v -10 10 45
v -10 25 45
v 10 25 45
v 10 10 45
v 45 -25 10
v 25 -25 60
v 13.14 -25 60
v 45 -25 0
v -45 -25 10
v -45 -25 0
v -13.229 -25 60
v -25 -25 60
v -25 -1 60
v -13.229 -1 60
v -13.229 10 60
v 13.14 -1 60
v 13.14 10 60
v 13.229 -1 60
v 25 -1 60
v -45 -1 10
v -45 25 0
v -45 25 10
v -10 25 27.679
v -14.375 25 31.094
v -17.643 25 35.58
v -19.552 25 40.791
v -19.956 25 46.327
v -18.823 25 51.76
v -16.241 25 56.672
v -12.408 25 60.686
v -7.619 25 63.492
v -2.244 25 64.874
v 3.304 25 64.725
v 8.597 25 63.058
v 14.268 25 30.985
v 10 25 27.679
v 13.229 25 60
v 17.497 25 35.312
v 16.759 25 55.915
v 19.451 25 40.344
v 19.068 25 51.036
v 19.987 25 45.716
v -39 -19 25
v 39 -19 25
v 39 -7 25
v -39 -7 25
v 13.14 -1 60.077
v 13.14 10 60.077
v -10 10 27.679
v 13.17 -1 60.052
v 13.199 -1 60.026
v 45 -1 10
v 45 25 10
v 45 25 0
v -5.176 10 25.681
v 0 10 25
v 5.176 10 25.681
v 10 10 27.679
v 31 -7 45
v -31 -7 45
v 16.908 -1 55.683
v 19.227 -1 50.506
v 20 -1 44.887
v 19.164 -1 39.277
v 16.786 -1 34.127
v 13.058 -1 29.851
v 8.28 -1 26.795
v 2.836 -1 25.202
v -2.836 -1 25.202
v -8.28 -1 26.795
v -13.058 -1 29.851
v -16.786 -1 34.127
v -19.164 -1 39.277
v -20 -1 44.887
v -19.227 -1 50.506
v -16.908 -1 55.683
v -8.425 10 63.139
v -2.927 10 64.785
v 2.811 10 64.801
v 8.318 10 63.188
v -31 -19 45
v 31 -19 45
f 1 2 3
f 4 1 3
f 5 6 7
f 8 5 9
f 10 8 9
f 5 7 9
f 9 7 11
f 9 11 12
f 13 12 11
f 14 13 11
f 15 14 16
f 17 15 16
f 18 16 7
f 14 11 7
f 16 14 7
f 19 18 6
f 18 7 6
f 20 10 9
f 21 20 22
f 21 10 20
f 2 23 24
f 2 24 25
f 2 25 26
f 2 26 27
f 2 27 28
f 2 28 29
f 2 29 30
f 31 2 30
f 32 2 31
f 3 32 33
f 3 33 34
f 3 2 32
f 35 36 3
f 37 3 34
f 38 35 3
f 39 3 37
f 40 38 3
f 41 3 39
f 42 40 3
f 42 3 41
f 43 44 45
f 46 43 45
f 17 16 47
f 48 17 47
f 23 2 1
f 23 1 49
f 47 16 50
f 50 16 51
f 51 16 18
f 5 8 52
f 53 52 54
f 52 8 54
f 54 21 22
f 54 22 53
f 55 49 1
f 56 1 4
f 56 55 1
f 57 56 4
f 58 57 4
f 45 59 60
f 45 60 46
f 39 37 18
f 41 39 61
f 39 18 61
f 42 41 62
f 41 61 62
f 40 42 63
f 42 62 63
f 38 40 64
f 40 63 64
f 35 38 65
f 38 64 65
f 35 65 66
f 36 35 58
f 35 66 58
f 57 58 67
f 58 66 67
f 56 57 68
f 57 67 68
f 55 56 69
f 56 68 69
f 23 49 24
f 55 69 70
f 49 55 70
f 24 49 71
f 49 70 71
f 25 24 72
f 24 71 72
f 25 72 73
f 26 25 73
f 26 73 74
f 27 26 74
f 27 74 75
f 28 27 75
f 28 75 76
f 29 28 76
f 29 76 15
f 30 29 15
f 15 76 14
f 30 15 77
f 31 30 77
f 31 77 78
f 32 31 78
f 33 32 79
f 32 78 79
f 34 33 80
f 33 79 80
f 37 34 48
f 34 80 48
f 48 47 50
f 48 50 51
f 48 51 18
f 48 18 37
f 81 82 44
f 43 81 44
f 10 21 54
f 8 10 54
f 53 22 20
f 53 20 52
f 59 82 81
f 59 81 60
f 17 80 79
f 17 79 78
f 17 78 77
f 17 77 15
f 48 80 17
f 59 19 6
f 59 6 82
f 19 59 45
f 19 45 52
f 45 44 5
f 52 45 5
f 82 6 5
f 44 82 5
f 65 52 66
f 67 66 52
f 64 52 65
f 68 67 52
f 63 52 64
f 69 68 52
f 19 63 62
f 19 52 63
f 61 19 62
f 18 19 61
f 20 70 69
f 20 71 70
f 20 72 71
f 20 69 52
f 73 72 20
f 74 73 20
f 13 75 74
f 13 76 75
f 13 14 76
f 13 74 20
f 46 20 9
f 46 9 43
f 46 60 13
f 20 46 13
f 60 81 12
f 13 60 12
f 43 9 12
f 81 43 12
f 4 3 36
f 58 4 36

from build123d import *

# Parameters (mm, degrees)
SKETCH3_W           = 90
SKETCH3_H           = 50
BOSS_EXTRUDE1_DEPTH = 10
BOSS_EXTRUDE2_DEPTH = 24
SKETCH5_R           = 20
BOSS_EXTRUDE3_DEPTH = 26
SKETCH6_W           = 20
SKETCH6_H           = 27.110350909
CUT_EXTRUDE1_DEPTH  = 15
SKETCH7_W           = 26.369202788
SKETCH7_H           = 10.718734527
CUT_EXTRUDE2_DEPTH  = 35
SKETCH9_W           = 20
SKETCH9_H           = 12
CUT_EXTRUDE3_DEPTH  = 114.798066767


with BuildPart() as part:
    # Sketch3 → Boss-Extrude1 (new body)
    with BuildSketch(Plane.XY):
        Rectangle(SKETCH3_W, SKETCH3_H)
    extrude(amount=BOSS_EXTRUDE1_DEPTH)

    # Sketch4 → Boss-Extrude2 (add)
    with BuildSketch(Plane.XZ.offset(25)):
        Polygon((45, 10), (-45, 10), (-25, 60), (25, 60), align=None)
    extrude(amount=-BOSS_EXTRUDE2_DEPTH)

    # Sketch5 → Boss-Extrude3 (add)
    with BuildSketch(Plane(origin=(0, -1, 0), x_dir=(1, 0, 0), z_dir=(0, 1, 0))):
        with Locations(Location((0, -45, 0), (0, 0, 311.409622109))):
            Circle(SKETCH5_R)
    extrude(amount=BOSS_EXTRUDE3_DEPTH)

    # Sketch6 → Cut-Extrude1 (cut)
    with BuildSketch(Plane(origin=(0, 25, 0), x_dir=(1, 0, 0), z_dir=(0, 1, 0))):
        with Locations((0, -31.444824546)):
            Rectangle(SKETCH6_W, SKETCH6_H)
    extrude(amount=-CUT_EXTRUDE1_DEPTH, mode=Mode.SUBTRACT)

    # Sketch7 → Cut-Extrude2 (cut)
    with BuildSketch(Plane.XZ.offset(25)):
        with Locations((-0.044155161, 65.359367264)):
            Rectangle(SKETCH7_W, SKETCH7_H)
    extrude(amount=-CUT_EXTRUDE2_DEPTH, mode=Mode.SUBTRACT)

    # Sketch9 → Cut-Extrude3 (cut, through all)
    with BuildSketch(Plane(origin=(45, 0, 0), x_dir=(0, 0, -1), z_dir=(1, 0, 0))):
        with Locations((-35, -13)):
            Rectangle(SKETCH9_W, SKETCH9_H)
    extrude(amount=-CUT_EXTRUDE3_DEPTH, mode=Mode.SUBTRACT)


solid = part.part
